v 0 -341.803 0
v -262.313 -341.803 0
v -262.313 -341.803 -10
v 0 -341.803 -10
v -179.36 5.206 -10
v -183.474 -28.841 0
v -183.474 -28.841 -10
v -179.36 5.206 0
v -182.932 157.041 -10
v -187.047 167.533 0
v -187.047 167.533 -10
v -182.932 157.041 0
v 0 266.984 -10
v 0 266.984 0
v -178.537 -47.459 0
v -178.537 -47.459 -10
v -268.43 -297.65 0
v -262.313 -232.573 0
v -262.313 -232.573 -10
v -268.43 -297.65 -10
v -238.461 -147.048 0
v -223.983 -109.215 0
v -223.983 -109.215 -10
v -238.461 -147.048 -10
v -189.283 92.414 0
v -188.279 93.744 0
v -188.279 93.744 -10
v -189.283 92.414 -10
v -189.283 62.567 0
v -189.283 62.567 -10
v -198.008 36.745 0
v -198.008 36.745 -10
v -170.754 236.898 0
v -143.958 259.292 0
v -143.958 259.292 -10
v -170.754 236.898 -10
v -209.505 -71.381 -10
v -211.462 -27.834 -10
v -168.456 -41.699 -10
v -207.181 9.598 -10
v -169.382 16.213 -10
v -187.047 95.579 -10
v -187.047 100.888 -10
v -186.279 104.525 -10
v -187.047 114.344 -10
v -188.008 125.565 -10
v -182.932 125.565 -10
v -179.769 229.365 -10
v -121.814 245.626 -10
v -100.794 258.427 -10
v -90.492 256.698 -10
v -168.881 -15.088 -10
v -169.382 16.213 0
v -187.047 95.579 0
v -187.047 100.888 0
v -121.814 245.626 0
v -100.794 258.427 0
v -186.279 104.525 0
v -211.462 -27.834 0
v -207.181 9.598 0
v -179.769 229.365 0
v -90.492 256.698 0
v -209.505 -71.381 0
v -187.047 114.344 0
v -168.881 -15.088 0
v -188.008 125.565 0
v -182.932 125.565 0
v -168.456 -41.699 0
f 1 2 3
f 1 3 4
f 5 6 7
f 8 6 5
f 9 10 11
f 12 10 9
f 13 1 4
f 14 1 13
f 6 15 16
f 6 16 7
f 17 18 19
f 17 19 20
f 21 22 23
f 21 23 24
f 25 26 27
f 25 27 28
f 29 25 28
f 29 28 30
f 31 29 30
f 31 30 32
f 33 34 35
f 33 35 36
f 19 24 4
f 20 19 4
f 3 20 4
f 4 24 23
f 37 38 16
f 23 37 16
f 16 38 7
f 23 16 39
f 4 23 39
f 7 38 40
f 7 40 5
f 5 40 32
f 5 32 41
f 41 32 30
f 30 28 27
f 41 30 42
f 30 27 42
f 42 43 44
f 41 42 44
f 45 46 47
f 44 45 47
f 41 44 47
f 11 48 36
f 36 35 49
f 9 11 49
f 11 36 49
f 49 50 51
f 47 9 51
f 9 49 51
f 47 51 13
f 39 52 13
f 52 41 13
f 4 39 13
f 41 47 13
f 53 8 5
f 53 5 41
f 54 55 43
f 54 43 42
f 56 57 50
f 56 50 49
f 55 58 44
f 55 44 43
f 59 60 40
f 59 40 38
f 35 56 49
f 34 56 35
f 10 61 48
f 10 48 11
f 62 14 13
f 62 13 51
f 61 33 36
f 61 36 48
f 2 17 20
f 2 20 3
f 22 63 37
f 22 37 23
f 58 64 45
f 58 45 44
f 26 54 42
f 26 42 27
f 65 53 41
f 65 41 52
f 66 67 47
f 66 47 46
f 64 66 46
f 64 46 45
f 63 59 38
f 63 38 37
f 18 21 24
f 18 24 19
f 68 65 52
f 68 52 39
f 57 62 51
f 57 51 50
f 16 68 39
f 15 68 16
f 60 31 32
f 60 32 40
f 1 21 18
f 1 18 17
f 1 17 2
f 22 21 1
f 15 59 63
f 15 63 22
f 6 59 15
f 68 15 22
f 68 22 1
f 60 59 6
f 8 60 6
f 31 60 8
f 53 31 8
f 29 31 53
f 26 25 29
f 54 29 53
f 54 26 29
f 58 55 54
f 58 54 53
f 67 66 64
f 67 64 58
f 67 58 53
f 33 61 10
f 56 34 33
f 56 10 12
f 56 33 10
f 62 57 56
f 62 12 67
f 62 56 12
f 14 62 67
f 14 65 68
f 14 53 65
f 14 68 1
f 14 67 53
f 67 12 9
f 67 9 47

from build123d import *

# Parameters (mm, degrees)
F1_DEPTH = 10


with BuildPart() as f1:
    # F0 (on Top) → F1 (new body)
    with BuildSketch(Plane.XY):
        Polygon((-9.0848000015, -110.7615454752), (-56.1383759786, -99.5413844552), (-60.5711821835, -172.3231920342), (-46.2314955784, -166.9866744318), (-31.8368203584, -161.629692804), (-12.4792818206, -185.2976312547), (-8.3274594973, -173.0151698079), align=None)
        Polygon((-46.2314955784, -166.9866744318), (-60.5711821835, -172.3231920342), (-36.5771841639, -219.3779317834), (-30.0718690254, -195.3284089729), align=None)
        Polygon((-73.3901330708, -341.8031902357), (-67.6759054309, -305.1561174487), (-117.473756471, -341.8031902357), align=None)
        Polygon((-180.8332437482, -164.6954374649), (-178.1702202991, -127.8611419204), (-191.2844337417, -85.1857664238), (-223.9830016906, -109.2145339581), (-199.4350007827, -142.6196794592), align=None)
        Polygon((-60.5711821835, -172.3231920342), (-56.1383759786, -99.5413844552), (-76.2307639896, -111.0958880131), align=None)
        with BuildLine():
            Line((0, -56.0086877966), (0, 0))
            Line((0, 0), (0, 183.04142414))
            ThreePointArc((0, 183.04142414), (-12.1429681008, 182.0306137788), (-24.2587123077, 180.7336349065))
            ThreePointArc((-24.2587123077, 180.7336349065), (-43.8384967055, 178.022818891), (-63.3002183714, 174.5648035161))
            Line((-63.3002183714, 174.5648035161), (-90.1476441557, 159.7151652456))
            Line((-90.1476441557, 159.7151652456), (-110.0777075737, 125.0936001484))
            Line((-110.0777075737, 125.0936001484), (-117.5709400449, 112.443005226))
            Line((-117.5709400449, 112.443005226), (-121.5424738016, 81.778090181))
            Line((-121.5424738016, 81.778090181), (-120.5897784893, 63.4272970351))
            Line((-120.5897784893, 63.4272970351), (-118.2717298581, 18.7771025967))
            Line((-118.2717298581, 18.7771025967), (-91.0548188771, -12.1895038479))
            Line((-91.0548188771, -12.1895038479), (-67.1898289679, -36.0534735031))
            Line((-67.1898289679, -36.0534735031), (-44.5592410741, -45.3110454311))
            Line((-44.5592410741, -45.3110454311), (0, -56.0086877966))
        make_face()
        Polygon((-219.0594424787, -207.1807143872), (-180.8332437482, -164.6954374649), (-199.4350007827, -142.6196794592), (-244.2064624437, -167.6488361397), (-244.2064624437, -235.1295594847), (-244.1253321165, -235.0393897966), align=None)
        Polygon((-69.332321625, -272.619905615), (-51.1947474372, -233.2889083715), (-91.4025763749, -247.6959746369), (-105.8642157468, -277.2303671094), (-110.9766685206, -287.2999995754), align=None)
        Polygon((-178.5368838703, -47.4589412792), (-191.2844337417, -85.1857664238), (-103.998360561, -43.181896403), (-115.1686413361, -25.682248799), (-121.2751949675, -16.1155656711), (-132.4912150412, -15.850094913), (-168.4559845523, -41.6986706085), align=None)
        Polygon((-115.2799656319, -272.619905615), (-104.626763126, -238.5452330401), (-164.9988434448, -237.3814824562), (-186.9655664085, -307.6428796384), (-147.3245982234, -288.275746156), align=None)
        Polygon((-147.3245982234, -288.275746156), (-186.9655664085, -307.6428796384), (-225.461235686, -326.9737341095), (-203.2383822965, -341.8031902357), align=None)
        Polygon((-100.8472110518, -292.6593101859), (-110.9766685206, -287.2999995754), (-138.6484816888, -341.8031902357), (-117.473756471, -341.8031902357), align=None)
        Polygon((-112.8765014321, -132.1697047954), (-103.998360561, -83.2290777974), (-178.1702202991, -127.8611419204), (-132.6259808253, -176.1945950219), align=None)
        Polygon((-178.1702202991, -127.8611419204), (-103.998360561, -83.2290777974), (-191.2844337417, -85.1857664238), align=None)
        Polygon((-90.8448589252, -184.2596719807), (-112.8765014321, -132.1697047954), (-132.6259808253, -176.1945950219), (-108.3129286229, -207.0093147384), align=None)
        Polygon((-26.3059871691, 236.8900387434), (0, 200.9310461479), (0, 266.9844396385), (-90.4915869948, 256.698241221), (-90.4915869948, 236.9089266819), (-67.691279032, 236.9089266819), (-52.4303249207, 253.3576469712), (-44.5592410741, 261.8413404297), align=None)
        Polygon((-145.4554682746, 109.5463630128), (-126.266214477, 156.0594467116), (-155.6719385674, 161.4210224536), align=None)
        Polygon((-225.461235686, -326.9737341095), (-186.9655664085, -307.6428796384), (-222.7215119105, -236.4381093161), (-268.4299686655, -297.649834803), align=None)
        Polygon((-138.6484816888, -341.8031902357), (-147.3245982234, -288.275746156), (-203.2383822965, -341.8031902357), align=None)
        Polygon((-223.9830016906, -109.2145339581), (-191.2844337417, -85.1857664238), (-178.5368838703, -47.4589412792), (-209.5049759154, -71.3810654092), align=None)
        Polygon((-132.6259808253, -176.1945950219), (-178.1702202991, -127.8611419204), (-180.8332437482, -164.6954374649), (-219.0594424787, -207.1807143872), (-162.4549610771, -232.5733737044), align=None)
        Polygon((-168.8814023684, -15.0877447128), (-168.4559845523, -41.6986706085), (-132.4912150412, -15.850094913), (-160.5595044997, 3.8948894653), align=None)
        Polygon((-126.266214477, 156.0594467116), (-91.0839805971, 200.9310461479), (-91.0839805971, 211.6955617738), (-118.1022370987, 214.7468585147), (-119.6827789183, 201.3186872483), (-122.9745003909, 180.9520327), (-160.6235661183, 180.9520327), (-164.1089604542, 184.0228917319), (-183.1327547534, 171.6665067373), (-182.9318682558, 157.0410916611), (-182.9318682558, 125.5653286399), (-167.9374396819, 116.997453287), (-161.000895729, 122.7428464239), (-145.4554682746, 109.5463630128), (-155.6719385674, 161.4210224536), align=None)
        Polygon((-128.2701594184, 162.3996241842), (-155.6719385674, 161.4210224536), (-153.9593301405, 177.0785171865), (-128.2701594184, 176.0999302288), align=None, mode=Mode.SUBTRACT)
        Polygon((-103.998360561, -83.2290777974), (-73.3901330708, -63.691398935), (-90.9000652816, -41.7426421686), (-103.998360561, -43.181896403), align=None)
        Polygon((-108.3129286229, -207.0093147384), (-132.6259808253, -176.1945950219), (-162.4549610771, -232.5733737044), align=None)
        Polygon((-76.2307639896, -111.0958880131), (-56.1383759786, -99.5413844552), (-103.998360561, -83.2290777974), (-112.8765014321, -132.1697047954), align=None)
        Polygon((-36.7759240923, -253.3689891762), (-51.1947474372, -233.2889083715), (-69.332321625, -272.619905615), align=None)
        Polygon((-91.0839805971, 200.9310461479), (-26.3059871691, 236.8900387434), (-44.5592410741, 261.8413404297), (-52.4303249207, 253.3576469712), align=None)
        Polygon((-75.1025455423, -161.4246713618), (-76.2307639896, -111.0958880131), (-112.8765014321, -132.1697047954), (-90.8448589252, -184.2596719807), align=None)
        Polygon((-199.4350007827, -142.6196794592), (-223.9830016906, -109.2145339581), (-238.4610274657, -147.048002507), (-244.2064624437, -167.6488361397), align=None)
        Polygon((-191.2844337417, -85.1857664238), (-103.998360561, -83.2290777974), (-103.998360561, -43.181896403), align=None)
        Polygon((-103.998360561, -83.2290777974), (-56.1383759786, -99.5413844552), (-73.3901330708, -63.691398935), align=None)
        Polygon((-90.1476441557, 159.7151652456), (-63.3002183714, 174.5648035161), (-91.0839805971, 200.9310461479), align=None)
        Polygon((-67.6759054309, -305.1561174487), (-100.8472110518, -292.6593101859), (-117.473756471, -341.8031902357), align=None)
        Polygon((-104.626763126, -238.5452330401), (-108.3129286229, -207.0093147384), (-162.4549610771, -232.5733737044), (-164.9988434448, -237.3814824562), align=None)
        Polygon((-91.0839805971, 200.9310461479), (-45.5419902985, 200.9310461479), (-26.3059871691, 236.8900387434), align=None)
        Polygon((-45.5419902985, 200.9310461479), (0, 200.9310461479), (-26.3059871691, 236.8900387434), align=None)
        Polygon((-105.8642157468, -277.2303671094), (-115.2799656319, -272.619905615), (-147.3245982234, -288.275746156), (-138.6484816888, -341.8031902357), (-110.9766685206, -287.2999995754), align=None)
        Polygon((-90.1476441557, 159.7151652456), (-91.0839805971, 200.9310461479), (-126.266214477, 156.0594467116), (-126.266214477, 98.2510494237), (-117.5709400449, 112.443005226), (-110.0777075737, 125.0936001484), align=None)
        Polygon((0, -280.3467120072), (-14.2974299663, -277.1022620157), (0, -326.679632709), align=None)
        Polygon((-51.1947474372, -233.2889083715), (-65.5583828964, -207.9411011242), (-91.4025763749, -247.6959746369), align=None)
        Polygon((-118.1022370987, 214.7468585147), (-91.0839805971, 211.6955617738), (-121.5343782481, 235.0574086031), (-136.7585983685, 233.4549272522), (-160.6235661183, 230.9429321907), (-160.6235661183, 200.7840914456), (-160.6235661183, 180.9520327), (-119.6827789183, 201.3186872483), align=None)
        Polygon((-162.4549610771, -232.5733737044), (-219.0594424787, -207.1807143872), (-244.1253321165, -235.0393897966), (-244.1278405297, -235.134347985), (-222.7215119105, -236.4381093161), (-164.9988434448, -237.3814824562), align=None)
        Polygon((-63.3002183714, 174.5648035161), (-45.5419902985, 200.9310461479), (-91.0839805971, 200.9310461479), align=None)
        Polygon((-56.1383759786, -99.5413844552), (-35.3859818241, -65.0423578409), (-73.3901330708, -63.691398935), align=None)
        Polygon((-186.9655664085, -307.6428796384), (-164.9988434448, -237.3814824562), (-222.7215119105, -236.4381093161), align=None)
        Polygon((-244.2064624437, -235.1295594847), (-262.3134825626, -232.5733737044), (-268.4299686655, -297.649834803), (-222.7215119105, -236.4381093161), (-244.1278405297, -235.134347985), align=None)
        Polygon((0, -175.0910735831), (0, -112.3517529746), (-9.0848000015, -110.7615454752), (-8.3274594973, -173.0151698079), (-12.4792818206, -185.2976312547), align=None)
        Polygon((-160.6235661183, 200.7840914456), (-160.6235661183, 230.9429321907), (-183.1327547534, 200.7840914456), align=None)
        with BuildLine():
            ThreePointArc((-24.2587123077, 180.7336349065), (-12.1429681008, 182.0306137788), (0, 183.04142414))
            Line((0, 183.04142414), (0, 200.9310461479))
            Line((0, 200.9310461479), (-45.5419902985, 200.9310461479))
            Line((-45.5419902985, 200.9310461479), (-24.2587123077, 180.7336349065))
        make_face()
        Polygon((-207.1807247874, 9.597514079), (-211.4622384682, -27.8336724946), (-193.2377589594, -10.3311773052), align=None)
        Polygon((-100.8472110518, -224.9932698232), (-73.3901330708, -194.120248152), (-108.3129286229, -207.0093147384), (-104.626763126, -238.5452330401), align=None)
        Polygon((-179.3598086986, 5.2063697262), (-198.0077592053, 36.745230469), (-207.1807247874, 9.597514079), align=None)
        Polygon((-126.266214477, 98.2510494237), (-126.266214477, 156.0594467116), (-145.4554682746, 109.5463630128), align=None)
        Polygon((-124.6032858295, 18.9269635057), (-118.2717298581, 18.7771025967), (-120.5897784893, 63.4272970351), (-146.9668106058, 19.456283339), (-134.5117213963, 19.1614851884), align=None)
        Polygon((-36.7759240923, -253.3689891762), (-69.332321625, -272.619905615), (-35.9529918776, -275.1757215485), align=None)
        Polygon((-244.2064624437, -235.1295594847), (-244.2064624437, -167.6488361397), (-262.3134825626, -232.5733737044), align=None)
        Polygon((-36.5771841639, -219.3779317834), (-60.5711821835, -172.3231920342), (-73.3901330708, -194.120248152), (-65.5583828964, -207.9411011242), (-51.1947474372, -233.2889083715), align=None)
        Polygon((-211.4622384682, -27.8336724947), (-209.5049759154, -71.3810654092), (-192.8467724969, -44.7100751986), align=None)
        Polygon((-60.5711821835, -172.3231920342), (-76.2307639896, -111.0958880131), (-75.1025455423, -161.4246713618), (-73.3901330708, -194.1202481519), align=None)
        Polygon((0, -64.2491116145), (0, -56.0086877966), (-44.5592410741, -45.3110454311), (-67.1898289679, -36.0534735031), (-91.0548188771, -12.1895038479), (-118.2717298581, 18.7771025967), (-111.8023189882, 0), (-96.2303815507, -17.188950378), (-70.8576630889, -40.1913407085), (-73.3901330708, -63.691398935), (-35.3859818241, -65.0423578409), align=None)
        Polygon((0, -98.5291272535), (0, -64.2491116145), (-35.3859818241, -65.0423578409), (-56.1383759786, -99.5413844552), (-35.3859818241, -88.8284441579), (-18.8707314396, -80.302830677), align=None)
        Polygon((-225.461235686, -326.9737341095), (-268.4299686655, -297.649834803), (-262.3134825626, -341.8031902357), (-203.2383822965, -341.8031902357), align=None)
        Polygon((-65.5583828964, -207.9411011242), (-73.3901330708, -194.1202481519), (-91.4025763749, -240.6699612755), (-91.4025763749, -247.6959746369), align=None)
        Polygon((-122.9745003909, 180.9520327), (-119.6827789183, 201.3186872483), (-160.6235661183, 180.9520327), align=None)
        Polygon((-91.4025763749, -247.6959746369), (-104.626763126, -238.5452330401), (-115.2799656319, -272.619905615), (-105.8642157468, -277.2303671094), align=None)
        with BuildLine():
            ThreePointArc((-63.3002183714, 174.5648035161), (-43.8384967055, 178.022818891), (-24.2587123077, 180.7336349065))
            Line((-24.2587123077, 180.7336349065), (-45.5419902985, 200.9310461479))
            Line((-45.5419902985, 200.9310461479), (-63.3002183714, 174.5648035161))
        make_face()
        Polygon((-136.7585983685, 233.4549272522), (-136.7585983685, 246.1665023031), (-160.6235661183, 230.9429321907), align=None)
        Polygon((0, -220.3067341793), (-18.4286041621, -221.2719219721), (0, -235.2843056938), align=None)
        Polygon((-135.0558286982, 7.3890497706), (-146.9668106058, 19.456283339), (-142.3466871056, 43.4612742486), (-155.6265254516, 66.9658715101), (-167.9374396819, 61.5911086505), (-158.4689818362, 43.2722844393), (-189.2827708595, 62.5671423682), (-176.4572573224, 37.8640410816), (-198.0077592053, 36.745230469), (-179.3598086986, 5.2063697262), (-169.3817879105, 16.2125959761), (-167.0568583851, 18.7771025967), (-154.9811573992, 34.7985962376), (-151.1675312539, 27.6595571569), (-160.5595044997, 3.8948894653), align=None)
        Polygon((-176.4572573224, 37.8640410816), (-189.2827708595, 62.5671423682), (-198.0077592053, 36.745230469), align=None)
        Polygon((-146.9668106058, 19.456283339), (-120.5897784893, 63.4272970351), (-137.0578679345, 74.8583050578), (-141.2991845332, 50.7912143836), (-149.4696070974, 83.0550824895), (-149.4696070974, 69.6538908952), (-155.6265254516, 66.9658715101), (-142.3466871056, 43.4612742486), align=None)
        Polygon((-91.0839805971, 211.6955617738), (-91.0839805971, 200.9310461479), (-52.4303249207, 253.3576469712), (-67.691279032, 236.9089266819), align=None)
        Polygon((-67.691279032, 236.9089266819), (-90.4915869948, 236.9089266819), (-121.5343782481, 235.0574086031), (-91.0839805971, 211.6955617738), align=None)
        Polygon((-35.9529918776, -275.1757215485), (-69.332321625, -272.619905615), (-53.285172983, -289.1620015421), align=None)
        Polygon((-91.4025763749, -240.6699612755), (-73.3901330708, -194.120248152), (-100.8472110518, -224.9932698232), align=None)
        Polygon((-90.4915869948, 236.9089266819), (-90.4915869948, 256.698241221), (-100.7942867503, 258.4274100775), (-121.5343782481, 235.0574086031), align=None)
        Polygon((-31.8368203584, -161.629692804), (-46.2314955784, -166.9866744318), (-30.0718690254, -195.3284089729), align=None)
        Polygon((-160.6235661183, 230.9429321907), (-170.7540452849, 236.898350978), (-179.7687227862, 229.3646685872), (-183.1327547534, 200.7840914456), align=None)
        Polygon((-60.5942279197, -318.6514141551), (-73.3901330708, -341.8031902357), (-43.9733349894, -331.044023416), (-25.8534417635, -324.4166891483), align=None)
        Polygon((-137.0578679345, 74.8583050578), (-120.5897784893, 63.4272970351), (-121.5424738016, 81.778090181), align=None)
        Polygon((0, -209.1648444865), (0, -189.5159844786), (-12.4792818206, -185.2976312547), (-30.0718690254, -195.3284089729), align=None)
        Polygon((-43.9733349894, -331.044023416), (-73.3901330708, -341.8031902357), (-49.683611929, -341.8031902357), align=None)
        Polygon((-43.9733349894, -331.044023416), (-49.683611929, -341.8031902357), (-29.3898579874, -341.8031902357), align=None)
        Polygon((-53.285172983, -289.1620015421), (-69.332321625, -272.619905615), (-110.9766685206, -287.2999995754), (-100.8472110518, -292.6593101859), (-67.6759054309, -305.1561174487), align=None)
        Polygon((-121.5343782481, 235.0574086031), (-100.7942867503, 258.4274100775), (-121.8137708667, 245.6259616072), (-143.9577465644, 259.2923638284), (-160.6235661183, 230.9429321907), (-136.7585983685, 246.1665023031), align=None)
        Polygon((-36.8817018053, -288.0530584461), (-67.6759054309, -305.1561174487), (-46.4845498273, -313.8022958113), (-19.5109283249, -305.1561174487), (-24.1628781348, -300.2854692814), align=None)
        Polygon((-209.5049759154, -71.3810654092), (-178.5368838703, -47.4589412792), (-183.4744771589, -28.8409299731), (-179.3598086986, 5.2063697262), (-207.1807247874, 9.597514079), (-193.2377589594, -10.3311773052), (-211.4622384682, -27.8336724947), (-192.8467724969, -44.7100751986), align=None)
        Polygon((0, -112.3517529746), (0, -98.5291272535), (-56.1383759786, -99.5413844552), (-9.0848000015, -110.7615454752), align=None)
        Polygon((-90.9000652816, -41.7426421686), (-73.3901330708, -63.691398935), (-70.8576630889, -40.1913407085), (-97.6143223252, -32.7582730108), align=None)
        Polygon((0, -327.5633480528), (-29.3898579874, -341.8031902357), (0, -341.8031902357), align=None)
        Polygon((-159.0845608403, 76.6309867017), (-167.9374396819, 83.0550824895), (-189.2827708595, 62.5671423682), (-167.9374396819, 61.5911086505), align=None)
        Polygon((-73.3901330708, -194.1202481519), (-75.1025455423, -161.4246713618), (-90.8448589252, -184.2596719807), align=None)
        Polygon((0, -235.2843056938), (-11.3356103883, -244.4529040914), (-5.7283935779, -254.3480766129), (0, -260.3674351424), align=None)
        Polygon((-30.0718690254, -195.3284089729), (-12.4792818206, -185.2976312547), (-31.8368203584, -161.629692804), align=None)
        Polygon((-132.4912150412, -15.850094913), (-121.2751949674, -16.1155656711), (-135.0558286982, 7.3890497706), (-160.5595044997, 3.8948894653), align=None)
        Polygon((0, -220.3067341793), (0, -209.1648444865), (-18.4286041621, -221.2719219721), align=None)
        Polygon((-19.5109283249, -305.1561174487), (-46.4845498273, -313.8022958113), (-60.5942279197, -318.6514141551), (-25.8534417635, -324.4166891483), align=None)
        Polygon((-141.2991845332, 50.7912143836), (-137.0578679345, 74.8583050578), (-149.4696070974, 83.0550824895), align=None)
        Polygon((-189.2827708595, 62.5671423682), (-167.9374396819, 83.0550824895), (-167.9374396819, 116.997453287), (-182.9318682558, 125.5653286399), (-188.0084302879, 125.5653286399), (-187.0465219432, 114.3442193666), (-186.2794534792, 104.5250812017), (-187.0465219432, 100.8883606271), (-187.0465219432, 95.5787485882), (-188.2793949626, 93.743790939), (-189.2827708595, 92.4142366246), align=None)
        Polygon((-97.6143223252, -32.7582730108), (-70.8576630889, -40.1913407085), (-96.2303815507, -17.188950378), align=None)
        Polygon((-108.3129286229, -207.0093147384), (-73.3901330708, -194.120248152), (-90.8448589252, -184.2596719807), align=None)
        Polygon((-164.1089604542, 184.0228917319), (-160.6235661183, 180.9520327), (-160.6235661183, 200.7840914456), (-183.1327547534, 200.7840914456), align=None)
        Polygon((-46.4845498273, -313.8022958113), (-67.6759054309, -305.1561174487), (-73.3901330708, -341.8031902357), (-60.5942279197, -318.6514141551), align=None)
        Polygon((-25.8534417635, -324.4166891483), (-43.9733349894, -331.044023416), (-29.3898579874, -341.8031902357), (0, -327.5633480528), align=None)
        Polygon((-18.7484080699, -96.4496188887), (-35.3859818241, -88.8284441579), (-37.9532989904, -97.7951796488), align=None)
        Polygon((-56.1383759786, -99.5413844552), (0, -98.5291272535), (-18.8707314396, -80.3028306771), (-18.7484080699, -96.4496188887), (-37.9532989904, -97.7951796488), (-35.3859818241, -88.8284441579), align=None)
        Polygon((-153.9593301405, 177.0785171865), (-128.2701594184, 162.3996241842), (-128.2701594184, 176.0999302288), align=None)
        Polygon((0, -326.679632709), (-19.5109283249, -305.1561174487), (-25.8534417635, -324.4166891483), (0, -327.5633480528), align=None)
        Polygon((-164.1089604542, 184.0228917319), (-183.1327547534, 200.7840914456), (-187.0465219432, 167.5330028196), (-182.9318682558, 157.0410916611), (-183.1327547534, 171.6665067373), align=None)
        Polygon((-18.7484080699, -96.4496188887), (-18.8707314396, -80.3028306771), (-35.3859818241, -88.8284441579), align=None)
        Polygon((-117.5709400449, 112.443005226), (-126.266214477, 98.2510494237), (-167.9374396819, 83.0550824895), (-149.4696070974, 83.0550824895), (-121.5424738016, 81.778090181), align=None)
        Polygon((0, -260.3674351424), (-5.7283935779, -254.3480766129), (-9.8672773941, -258.1383321793), (0, -276.1014805879), align=None)
        Polygon((-169.3817879105, 16.2125959761), (-168.8814023684, -15.0877447128), (-160.5595044997, 3.8948894653), (-167.0568583851, 18.7771025967), align=None)
        Polygon((-153.9593301405, 177.0785171865), (-155.6719385674, 161.4210224536), (-128.2701594184, 162.3996241842), align=None)
        Polygon((-160.6235661183, 230.9429321907), (-143.9577465644, 259.2923638284), (-170.7540452849, 236.898350978), align=None)
        Polygon((0, -189.5159844786), (0, -175.0910735831), (-12.4792818206, -185.2976312547), align=None)
        Polygon((-118.2717298581, -7.8270727527), (-124.6032858295, 18.9269635057), (-134.5117213963, 19.1614851884), align=None)
        Polygon((-149.4696070974, 69.6538908952), (-159.0845608403, 76.6309867017), (-167.9374396819, 61.5911086505), (-155.6265254516, 66.9658715101), align=None)
        Polygon((-30.0718690254, -195.3284089729), (-36.5771841639, -219.3779317834), (-24.4849719167, -209.1648444865), (-19.0627055457, -209.1648444865), (0, -209.1648444865), align=None)
        Polygon((-109.0602074297, -18.9443588874), (-97.6143223252, -32.7582730108), (-96.2303815507, -17.188950378), (-111.8023189882, 0), (-118.2717298581, -7.8270727527), align=None)
        Polygon((-18.4286041621, -221.2719219721), (-36.5771841639, -219.3779317834), (-51.1947474372, -233.2889083715), (-26.1998137088, -247.409121429), (-11.3356103883, -244.4529040914), align=None)
        Polygon((-36.8817018053, -288.0530584461), (-53.285172983, -289.1620015421), (-67.6759054309, -305.1561174487), align=None)
        Polygon((-167.9374396819, 83.0550824895), (-126.266214477, 98.2510494237), (-145.4554682746, 109.5463630128), (-158.3862830984, 94.844402115), (-161.000895729, 122.7428464239), (-167.9374396819, 116.997453287), align=None)
        Polygon((-14.2974299663, -277.1022620157), (-24.1628781348, -300.2854692814), (-19.5109283249, -305.1561174487), (0, -326.679632709), align=None)
        Polygon((-111.8023189882, 0), (-118.2717298581, 18.7771025967), (-124.6032858295, 18.9269635057), (-118.2717298581, -7.8270727527), align=None)
        Polygon((-167.9374396819, 61.5911086505), (-189.2827708595, 62.5671423682), (-158.4689818362, 43.2722844393), align=None)
        Polygon((-158.3862830984, 94.844402115), (-145.4554682746, 109.5463630128), (-161.000895729, 122.7428464239), align=None)
        Polygon((-11.3356103883, -244.4529040914), (-26.1998137087, -247.409121429), (-16.6522514634, -264.3517913815), (-9.8672773941, -258.1383321793), (-5.7283935779, -254.3480766129), align=None)
        Polygon((-26.1998137088, -247.409121429), (-51.1947474372, -233.2889083715), (-36.7759240923, -253.3689891762), align=None)
        Polygon((-134.5117213963, 19.1614851884), (-146.9668106058, 19.456283339), (-135.0558286982, 7.3890497706), (-118.2717298581, -7.8270727527), align=None)
        Polygon((0, -235.2843056938), (-18.4286041621, -221.2719219721), (-11.3356103883, -244.4529040914), align=None)
        Polygon((-136.7585983685, 233.4549272522), (-121.5343782481, 235.0574086031), (-136.7585983685, 246.1665023031), align=None)
        Polygon((-154.9811573992, 34.7985962376), (-167.0568583851, 18.7771025967), (-151.1675312539, 27.6595571569), align=None)
        Polygon((-137.0578679345, 74.8583050578), (-121.5424738016, 81.778090181), (-149.4696070974, 83.0550824895), align=None)
        Polygon((-91.4025763749, -240.6699612755), (-100.8472110518, -224.9932698232), (-104.626763126, -238.5452330401), (-91.4025763749, -247.6959746369), align=None)
        Polygon((-16.6522514634, -264.3517913815), (-36.7759240923, -253.3689891762), (-35.9529918776, -275.1757215485), align=None)
        Polygon((-103.998360561, -43.181896403), (-90.9000652816, -41.7426421686), (-97.6143223252, -32.7582730108), (-109.0602074297, -18.9443588874), (-115.1686413361, -25.682248799), align=None)
        Polygon((-35.9529918776, -275.1757215485), (-53.285172983, -289.1620015421), (-36.8817018053, -288.0530584461), (-24.1628781348, -277.5901735663), (-21.564985234, -275.453069141), align=None)
        Polygon((-9.8672773941, -258.1383321793), (-16.6522514634, -264.3517913815), (0, -278.6730301923), (0, -276.1014805879), align=None)
        Polygon((-18.4286041621, -221.2719219721), (0, -209.1648444865), (-19.0627055457, -209.1648444865), align=None)
        Polygon((-16.6522514634, -264.3517913815), (-26.1998137088, -247.409121429), (-36.7759240923, -253.3689891762), align=None)
        Polygon((0, -278.6730301923), (-16.6522514634, -264.3517913815), (-21.564985234, -275.453069141), (-14.2974299663, -277.1022620157), (0, -280.3467120072), align=None)
        Polygon((-121.2751949675, -16.1155656711), (-115.1686413361, -25.682248799), (-109.0602074297, -18.9443588874), (-118.2717298581, -7.8270727527), (-135.0558286982, 7.3890497706), align=None)
        Polygon((-167.0568583851, 18.7771025967), (-160.5595044997, 3.8948894653), (-151.1675312539, 27.6595571569), align=None)
        Polygon((-24.4849719167, -209.1648444865), (-36.5771841639, -219.3779317834), (-18.4286041621, -221.2719219721), (-19.0627055457, -209.1648444865), align=None)
        Polygon((-149.4696070974, 83.0550824895), (-167.9374396819, 83.0550824895), (-159.0845608403, 76.6309867017), (-149.4696070974, 69.6538908952), align=None)
        Polygon((-16.6522514634, -264.3517913815), (-35.9529918776, -275.1757215485), (-21.564985234, -275.453069141), align=None)
        Polygon((-14.2974299663, -277.1022620157), (-21.564985234, -275.453069141), (-24.1628781348, -277.5901735663), (-24.1628781348, -300.2854692814), align=None)
        Polygon((-244.1278405297, -235.134347985), (-244.1253321165, -235.0393897966), (-244.2064624437, -235.1295594847), align=None)
        Polygon((-24.1628781348, -277.5901735663), (-36.8817018053, -288.0530584461), (-24.1628781348, -300.2854692814), align=None)
    extrude(amount=-F1_DEPTH)


solid = f1.part
